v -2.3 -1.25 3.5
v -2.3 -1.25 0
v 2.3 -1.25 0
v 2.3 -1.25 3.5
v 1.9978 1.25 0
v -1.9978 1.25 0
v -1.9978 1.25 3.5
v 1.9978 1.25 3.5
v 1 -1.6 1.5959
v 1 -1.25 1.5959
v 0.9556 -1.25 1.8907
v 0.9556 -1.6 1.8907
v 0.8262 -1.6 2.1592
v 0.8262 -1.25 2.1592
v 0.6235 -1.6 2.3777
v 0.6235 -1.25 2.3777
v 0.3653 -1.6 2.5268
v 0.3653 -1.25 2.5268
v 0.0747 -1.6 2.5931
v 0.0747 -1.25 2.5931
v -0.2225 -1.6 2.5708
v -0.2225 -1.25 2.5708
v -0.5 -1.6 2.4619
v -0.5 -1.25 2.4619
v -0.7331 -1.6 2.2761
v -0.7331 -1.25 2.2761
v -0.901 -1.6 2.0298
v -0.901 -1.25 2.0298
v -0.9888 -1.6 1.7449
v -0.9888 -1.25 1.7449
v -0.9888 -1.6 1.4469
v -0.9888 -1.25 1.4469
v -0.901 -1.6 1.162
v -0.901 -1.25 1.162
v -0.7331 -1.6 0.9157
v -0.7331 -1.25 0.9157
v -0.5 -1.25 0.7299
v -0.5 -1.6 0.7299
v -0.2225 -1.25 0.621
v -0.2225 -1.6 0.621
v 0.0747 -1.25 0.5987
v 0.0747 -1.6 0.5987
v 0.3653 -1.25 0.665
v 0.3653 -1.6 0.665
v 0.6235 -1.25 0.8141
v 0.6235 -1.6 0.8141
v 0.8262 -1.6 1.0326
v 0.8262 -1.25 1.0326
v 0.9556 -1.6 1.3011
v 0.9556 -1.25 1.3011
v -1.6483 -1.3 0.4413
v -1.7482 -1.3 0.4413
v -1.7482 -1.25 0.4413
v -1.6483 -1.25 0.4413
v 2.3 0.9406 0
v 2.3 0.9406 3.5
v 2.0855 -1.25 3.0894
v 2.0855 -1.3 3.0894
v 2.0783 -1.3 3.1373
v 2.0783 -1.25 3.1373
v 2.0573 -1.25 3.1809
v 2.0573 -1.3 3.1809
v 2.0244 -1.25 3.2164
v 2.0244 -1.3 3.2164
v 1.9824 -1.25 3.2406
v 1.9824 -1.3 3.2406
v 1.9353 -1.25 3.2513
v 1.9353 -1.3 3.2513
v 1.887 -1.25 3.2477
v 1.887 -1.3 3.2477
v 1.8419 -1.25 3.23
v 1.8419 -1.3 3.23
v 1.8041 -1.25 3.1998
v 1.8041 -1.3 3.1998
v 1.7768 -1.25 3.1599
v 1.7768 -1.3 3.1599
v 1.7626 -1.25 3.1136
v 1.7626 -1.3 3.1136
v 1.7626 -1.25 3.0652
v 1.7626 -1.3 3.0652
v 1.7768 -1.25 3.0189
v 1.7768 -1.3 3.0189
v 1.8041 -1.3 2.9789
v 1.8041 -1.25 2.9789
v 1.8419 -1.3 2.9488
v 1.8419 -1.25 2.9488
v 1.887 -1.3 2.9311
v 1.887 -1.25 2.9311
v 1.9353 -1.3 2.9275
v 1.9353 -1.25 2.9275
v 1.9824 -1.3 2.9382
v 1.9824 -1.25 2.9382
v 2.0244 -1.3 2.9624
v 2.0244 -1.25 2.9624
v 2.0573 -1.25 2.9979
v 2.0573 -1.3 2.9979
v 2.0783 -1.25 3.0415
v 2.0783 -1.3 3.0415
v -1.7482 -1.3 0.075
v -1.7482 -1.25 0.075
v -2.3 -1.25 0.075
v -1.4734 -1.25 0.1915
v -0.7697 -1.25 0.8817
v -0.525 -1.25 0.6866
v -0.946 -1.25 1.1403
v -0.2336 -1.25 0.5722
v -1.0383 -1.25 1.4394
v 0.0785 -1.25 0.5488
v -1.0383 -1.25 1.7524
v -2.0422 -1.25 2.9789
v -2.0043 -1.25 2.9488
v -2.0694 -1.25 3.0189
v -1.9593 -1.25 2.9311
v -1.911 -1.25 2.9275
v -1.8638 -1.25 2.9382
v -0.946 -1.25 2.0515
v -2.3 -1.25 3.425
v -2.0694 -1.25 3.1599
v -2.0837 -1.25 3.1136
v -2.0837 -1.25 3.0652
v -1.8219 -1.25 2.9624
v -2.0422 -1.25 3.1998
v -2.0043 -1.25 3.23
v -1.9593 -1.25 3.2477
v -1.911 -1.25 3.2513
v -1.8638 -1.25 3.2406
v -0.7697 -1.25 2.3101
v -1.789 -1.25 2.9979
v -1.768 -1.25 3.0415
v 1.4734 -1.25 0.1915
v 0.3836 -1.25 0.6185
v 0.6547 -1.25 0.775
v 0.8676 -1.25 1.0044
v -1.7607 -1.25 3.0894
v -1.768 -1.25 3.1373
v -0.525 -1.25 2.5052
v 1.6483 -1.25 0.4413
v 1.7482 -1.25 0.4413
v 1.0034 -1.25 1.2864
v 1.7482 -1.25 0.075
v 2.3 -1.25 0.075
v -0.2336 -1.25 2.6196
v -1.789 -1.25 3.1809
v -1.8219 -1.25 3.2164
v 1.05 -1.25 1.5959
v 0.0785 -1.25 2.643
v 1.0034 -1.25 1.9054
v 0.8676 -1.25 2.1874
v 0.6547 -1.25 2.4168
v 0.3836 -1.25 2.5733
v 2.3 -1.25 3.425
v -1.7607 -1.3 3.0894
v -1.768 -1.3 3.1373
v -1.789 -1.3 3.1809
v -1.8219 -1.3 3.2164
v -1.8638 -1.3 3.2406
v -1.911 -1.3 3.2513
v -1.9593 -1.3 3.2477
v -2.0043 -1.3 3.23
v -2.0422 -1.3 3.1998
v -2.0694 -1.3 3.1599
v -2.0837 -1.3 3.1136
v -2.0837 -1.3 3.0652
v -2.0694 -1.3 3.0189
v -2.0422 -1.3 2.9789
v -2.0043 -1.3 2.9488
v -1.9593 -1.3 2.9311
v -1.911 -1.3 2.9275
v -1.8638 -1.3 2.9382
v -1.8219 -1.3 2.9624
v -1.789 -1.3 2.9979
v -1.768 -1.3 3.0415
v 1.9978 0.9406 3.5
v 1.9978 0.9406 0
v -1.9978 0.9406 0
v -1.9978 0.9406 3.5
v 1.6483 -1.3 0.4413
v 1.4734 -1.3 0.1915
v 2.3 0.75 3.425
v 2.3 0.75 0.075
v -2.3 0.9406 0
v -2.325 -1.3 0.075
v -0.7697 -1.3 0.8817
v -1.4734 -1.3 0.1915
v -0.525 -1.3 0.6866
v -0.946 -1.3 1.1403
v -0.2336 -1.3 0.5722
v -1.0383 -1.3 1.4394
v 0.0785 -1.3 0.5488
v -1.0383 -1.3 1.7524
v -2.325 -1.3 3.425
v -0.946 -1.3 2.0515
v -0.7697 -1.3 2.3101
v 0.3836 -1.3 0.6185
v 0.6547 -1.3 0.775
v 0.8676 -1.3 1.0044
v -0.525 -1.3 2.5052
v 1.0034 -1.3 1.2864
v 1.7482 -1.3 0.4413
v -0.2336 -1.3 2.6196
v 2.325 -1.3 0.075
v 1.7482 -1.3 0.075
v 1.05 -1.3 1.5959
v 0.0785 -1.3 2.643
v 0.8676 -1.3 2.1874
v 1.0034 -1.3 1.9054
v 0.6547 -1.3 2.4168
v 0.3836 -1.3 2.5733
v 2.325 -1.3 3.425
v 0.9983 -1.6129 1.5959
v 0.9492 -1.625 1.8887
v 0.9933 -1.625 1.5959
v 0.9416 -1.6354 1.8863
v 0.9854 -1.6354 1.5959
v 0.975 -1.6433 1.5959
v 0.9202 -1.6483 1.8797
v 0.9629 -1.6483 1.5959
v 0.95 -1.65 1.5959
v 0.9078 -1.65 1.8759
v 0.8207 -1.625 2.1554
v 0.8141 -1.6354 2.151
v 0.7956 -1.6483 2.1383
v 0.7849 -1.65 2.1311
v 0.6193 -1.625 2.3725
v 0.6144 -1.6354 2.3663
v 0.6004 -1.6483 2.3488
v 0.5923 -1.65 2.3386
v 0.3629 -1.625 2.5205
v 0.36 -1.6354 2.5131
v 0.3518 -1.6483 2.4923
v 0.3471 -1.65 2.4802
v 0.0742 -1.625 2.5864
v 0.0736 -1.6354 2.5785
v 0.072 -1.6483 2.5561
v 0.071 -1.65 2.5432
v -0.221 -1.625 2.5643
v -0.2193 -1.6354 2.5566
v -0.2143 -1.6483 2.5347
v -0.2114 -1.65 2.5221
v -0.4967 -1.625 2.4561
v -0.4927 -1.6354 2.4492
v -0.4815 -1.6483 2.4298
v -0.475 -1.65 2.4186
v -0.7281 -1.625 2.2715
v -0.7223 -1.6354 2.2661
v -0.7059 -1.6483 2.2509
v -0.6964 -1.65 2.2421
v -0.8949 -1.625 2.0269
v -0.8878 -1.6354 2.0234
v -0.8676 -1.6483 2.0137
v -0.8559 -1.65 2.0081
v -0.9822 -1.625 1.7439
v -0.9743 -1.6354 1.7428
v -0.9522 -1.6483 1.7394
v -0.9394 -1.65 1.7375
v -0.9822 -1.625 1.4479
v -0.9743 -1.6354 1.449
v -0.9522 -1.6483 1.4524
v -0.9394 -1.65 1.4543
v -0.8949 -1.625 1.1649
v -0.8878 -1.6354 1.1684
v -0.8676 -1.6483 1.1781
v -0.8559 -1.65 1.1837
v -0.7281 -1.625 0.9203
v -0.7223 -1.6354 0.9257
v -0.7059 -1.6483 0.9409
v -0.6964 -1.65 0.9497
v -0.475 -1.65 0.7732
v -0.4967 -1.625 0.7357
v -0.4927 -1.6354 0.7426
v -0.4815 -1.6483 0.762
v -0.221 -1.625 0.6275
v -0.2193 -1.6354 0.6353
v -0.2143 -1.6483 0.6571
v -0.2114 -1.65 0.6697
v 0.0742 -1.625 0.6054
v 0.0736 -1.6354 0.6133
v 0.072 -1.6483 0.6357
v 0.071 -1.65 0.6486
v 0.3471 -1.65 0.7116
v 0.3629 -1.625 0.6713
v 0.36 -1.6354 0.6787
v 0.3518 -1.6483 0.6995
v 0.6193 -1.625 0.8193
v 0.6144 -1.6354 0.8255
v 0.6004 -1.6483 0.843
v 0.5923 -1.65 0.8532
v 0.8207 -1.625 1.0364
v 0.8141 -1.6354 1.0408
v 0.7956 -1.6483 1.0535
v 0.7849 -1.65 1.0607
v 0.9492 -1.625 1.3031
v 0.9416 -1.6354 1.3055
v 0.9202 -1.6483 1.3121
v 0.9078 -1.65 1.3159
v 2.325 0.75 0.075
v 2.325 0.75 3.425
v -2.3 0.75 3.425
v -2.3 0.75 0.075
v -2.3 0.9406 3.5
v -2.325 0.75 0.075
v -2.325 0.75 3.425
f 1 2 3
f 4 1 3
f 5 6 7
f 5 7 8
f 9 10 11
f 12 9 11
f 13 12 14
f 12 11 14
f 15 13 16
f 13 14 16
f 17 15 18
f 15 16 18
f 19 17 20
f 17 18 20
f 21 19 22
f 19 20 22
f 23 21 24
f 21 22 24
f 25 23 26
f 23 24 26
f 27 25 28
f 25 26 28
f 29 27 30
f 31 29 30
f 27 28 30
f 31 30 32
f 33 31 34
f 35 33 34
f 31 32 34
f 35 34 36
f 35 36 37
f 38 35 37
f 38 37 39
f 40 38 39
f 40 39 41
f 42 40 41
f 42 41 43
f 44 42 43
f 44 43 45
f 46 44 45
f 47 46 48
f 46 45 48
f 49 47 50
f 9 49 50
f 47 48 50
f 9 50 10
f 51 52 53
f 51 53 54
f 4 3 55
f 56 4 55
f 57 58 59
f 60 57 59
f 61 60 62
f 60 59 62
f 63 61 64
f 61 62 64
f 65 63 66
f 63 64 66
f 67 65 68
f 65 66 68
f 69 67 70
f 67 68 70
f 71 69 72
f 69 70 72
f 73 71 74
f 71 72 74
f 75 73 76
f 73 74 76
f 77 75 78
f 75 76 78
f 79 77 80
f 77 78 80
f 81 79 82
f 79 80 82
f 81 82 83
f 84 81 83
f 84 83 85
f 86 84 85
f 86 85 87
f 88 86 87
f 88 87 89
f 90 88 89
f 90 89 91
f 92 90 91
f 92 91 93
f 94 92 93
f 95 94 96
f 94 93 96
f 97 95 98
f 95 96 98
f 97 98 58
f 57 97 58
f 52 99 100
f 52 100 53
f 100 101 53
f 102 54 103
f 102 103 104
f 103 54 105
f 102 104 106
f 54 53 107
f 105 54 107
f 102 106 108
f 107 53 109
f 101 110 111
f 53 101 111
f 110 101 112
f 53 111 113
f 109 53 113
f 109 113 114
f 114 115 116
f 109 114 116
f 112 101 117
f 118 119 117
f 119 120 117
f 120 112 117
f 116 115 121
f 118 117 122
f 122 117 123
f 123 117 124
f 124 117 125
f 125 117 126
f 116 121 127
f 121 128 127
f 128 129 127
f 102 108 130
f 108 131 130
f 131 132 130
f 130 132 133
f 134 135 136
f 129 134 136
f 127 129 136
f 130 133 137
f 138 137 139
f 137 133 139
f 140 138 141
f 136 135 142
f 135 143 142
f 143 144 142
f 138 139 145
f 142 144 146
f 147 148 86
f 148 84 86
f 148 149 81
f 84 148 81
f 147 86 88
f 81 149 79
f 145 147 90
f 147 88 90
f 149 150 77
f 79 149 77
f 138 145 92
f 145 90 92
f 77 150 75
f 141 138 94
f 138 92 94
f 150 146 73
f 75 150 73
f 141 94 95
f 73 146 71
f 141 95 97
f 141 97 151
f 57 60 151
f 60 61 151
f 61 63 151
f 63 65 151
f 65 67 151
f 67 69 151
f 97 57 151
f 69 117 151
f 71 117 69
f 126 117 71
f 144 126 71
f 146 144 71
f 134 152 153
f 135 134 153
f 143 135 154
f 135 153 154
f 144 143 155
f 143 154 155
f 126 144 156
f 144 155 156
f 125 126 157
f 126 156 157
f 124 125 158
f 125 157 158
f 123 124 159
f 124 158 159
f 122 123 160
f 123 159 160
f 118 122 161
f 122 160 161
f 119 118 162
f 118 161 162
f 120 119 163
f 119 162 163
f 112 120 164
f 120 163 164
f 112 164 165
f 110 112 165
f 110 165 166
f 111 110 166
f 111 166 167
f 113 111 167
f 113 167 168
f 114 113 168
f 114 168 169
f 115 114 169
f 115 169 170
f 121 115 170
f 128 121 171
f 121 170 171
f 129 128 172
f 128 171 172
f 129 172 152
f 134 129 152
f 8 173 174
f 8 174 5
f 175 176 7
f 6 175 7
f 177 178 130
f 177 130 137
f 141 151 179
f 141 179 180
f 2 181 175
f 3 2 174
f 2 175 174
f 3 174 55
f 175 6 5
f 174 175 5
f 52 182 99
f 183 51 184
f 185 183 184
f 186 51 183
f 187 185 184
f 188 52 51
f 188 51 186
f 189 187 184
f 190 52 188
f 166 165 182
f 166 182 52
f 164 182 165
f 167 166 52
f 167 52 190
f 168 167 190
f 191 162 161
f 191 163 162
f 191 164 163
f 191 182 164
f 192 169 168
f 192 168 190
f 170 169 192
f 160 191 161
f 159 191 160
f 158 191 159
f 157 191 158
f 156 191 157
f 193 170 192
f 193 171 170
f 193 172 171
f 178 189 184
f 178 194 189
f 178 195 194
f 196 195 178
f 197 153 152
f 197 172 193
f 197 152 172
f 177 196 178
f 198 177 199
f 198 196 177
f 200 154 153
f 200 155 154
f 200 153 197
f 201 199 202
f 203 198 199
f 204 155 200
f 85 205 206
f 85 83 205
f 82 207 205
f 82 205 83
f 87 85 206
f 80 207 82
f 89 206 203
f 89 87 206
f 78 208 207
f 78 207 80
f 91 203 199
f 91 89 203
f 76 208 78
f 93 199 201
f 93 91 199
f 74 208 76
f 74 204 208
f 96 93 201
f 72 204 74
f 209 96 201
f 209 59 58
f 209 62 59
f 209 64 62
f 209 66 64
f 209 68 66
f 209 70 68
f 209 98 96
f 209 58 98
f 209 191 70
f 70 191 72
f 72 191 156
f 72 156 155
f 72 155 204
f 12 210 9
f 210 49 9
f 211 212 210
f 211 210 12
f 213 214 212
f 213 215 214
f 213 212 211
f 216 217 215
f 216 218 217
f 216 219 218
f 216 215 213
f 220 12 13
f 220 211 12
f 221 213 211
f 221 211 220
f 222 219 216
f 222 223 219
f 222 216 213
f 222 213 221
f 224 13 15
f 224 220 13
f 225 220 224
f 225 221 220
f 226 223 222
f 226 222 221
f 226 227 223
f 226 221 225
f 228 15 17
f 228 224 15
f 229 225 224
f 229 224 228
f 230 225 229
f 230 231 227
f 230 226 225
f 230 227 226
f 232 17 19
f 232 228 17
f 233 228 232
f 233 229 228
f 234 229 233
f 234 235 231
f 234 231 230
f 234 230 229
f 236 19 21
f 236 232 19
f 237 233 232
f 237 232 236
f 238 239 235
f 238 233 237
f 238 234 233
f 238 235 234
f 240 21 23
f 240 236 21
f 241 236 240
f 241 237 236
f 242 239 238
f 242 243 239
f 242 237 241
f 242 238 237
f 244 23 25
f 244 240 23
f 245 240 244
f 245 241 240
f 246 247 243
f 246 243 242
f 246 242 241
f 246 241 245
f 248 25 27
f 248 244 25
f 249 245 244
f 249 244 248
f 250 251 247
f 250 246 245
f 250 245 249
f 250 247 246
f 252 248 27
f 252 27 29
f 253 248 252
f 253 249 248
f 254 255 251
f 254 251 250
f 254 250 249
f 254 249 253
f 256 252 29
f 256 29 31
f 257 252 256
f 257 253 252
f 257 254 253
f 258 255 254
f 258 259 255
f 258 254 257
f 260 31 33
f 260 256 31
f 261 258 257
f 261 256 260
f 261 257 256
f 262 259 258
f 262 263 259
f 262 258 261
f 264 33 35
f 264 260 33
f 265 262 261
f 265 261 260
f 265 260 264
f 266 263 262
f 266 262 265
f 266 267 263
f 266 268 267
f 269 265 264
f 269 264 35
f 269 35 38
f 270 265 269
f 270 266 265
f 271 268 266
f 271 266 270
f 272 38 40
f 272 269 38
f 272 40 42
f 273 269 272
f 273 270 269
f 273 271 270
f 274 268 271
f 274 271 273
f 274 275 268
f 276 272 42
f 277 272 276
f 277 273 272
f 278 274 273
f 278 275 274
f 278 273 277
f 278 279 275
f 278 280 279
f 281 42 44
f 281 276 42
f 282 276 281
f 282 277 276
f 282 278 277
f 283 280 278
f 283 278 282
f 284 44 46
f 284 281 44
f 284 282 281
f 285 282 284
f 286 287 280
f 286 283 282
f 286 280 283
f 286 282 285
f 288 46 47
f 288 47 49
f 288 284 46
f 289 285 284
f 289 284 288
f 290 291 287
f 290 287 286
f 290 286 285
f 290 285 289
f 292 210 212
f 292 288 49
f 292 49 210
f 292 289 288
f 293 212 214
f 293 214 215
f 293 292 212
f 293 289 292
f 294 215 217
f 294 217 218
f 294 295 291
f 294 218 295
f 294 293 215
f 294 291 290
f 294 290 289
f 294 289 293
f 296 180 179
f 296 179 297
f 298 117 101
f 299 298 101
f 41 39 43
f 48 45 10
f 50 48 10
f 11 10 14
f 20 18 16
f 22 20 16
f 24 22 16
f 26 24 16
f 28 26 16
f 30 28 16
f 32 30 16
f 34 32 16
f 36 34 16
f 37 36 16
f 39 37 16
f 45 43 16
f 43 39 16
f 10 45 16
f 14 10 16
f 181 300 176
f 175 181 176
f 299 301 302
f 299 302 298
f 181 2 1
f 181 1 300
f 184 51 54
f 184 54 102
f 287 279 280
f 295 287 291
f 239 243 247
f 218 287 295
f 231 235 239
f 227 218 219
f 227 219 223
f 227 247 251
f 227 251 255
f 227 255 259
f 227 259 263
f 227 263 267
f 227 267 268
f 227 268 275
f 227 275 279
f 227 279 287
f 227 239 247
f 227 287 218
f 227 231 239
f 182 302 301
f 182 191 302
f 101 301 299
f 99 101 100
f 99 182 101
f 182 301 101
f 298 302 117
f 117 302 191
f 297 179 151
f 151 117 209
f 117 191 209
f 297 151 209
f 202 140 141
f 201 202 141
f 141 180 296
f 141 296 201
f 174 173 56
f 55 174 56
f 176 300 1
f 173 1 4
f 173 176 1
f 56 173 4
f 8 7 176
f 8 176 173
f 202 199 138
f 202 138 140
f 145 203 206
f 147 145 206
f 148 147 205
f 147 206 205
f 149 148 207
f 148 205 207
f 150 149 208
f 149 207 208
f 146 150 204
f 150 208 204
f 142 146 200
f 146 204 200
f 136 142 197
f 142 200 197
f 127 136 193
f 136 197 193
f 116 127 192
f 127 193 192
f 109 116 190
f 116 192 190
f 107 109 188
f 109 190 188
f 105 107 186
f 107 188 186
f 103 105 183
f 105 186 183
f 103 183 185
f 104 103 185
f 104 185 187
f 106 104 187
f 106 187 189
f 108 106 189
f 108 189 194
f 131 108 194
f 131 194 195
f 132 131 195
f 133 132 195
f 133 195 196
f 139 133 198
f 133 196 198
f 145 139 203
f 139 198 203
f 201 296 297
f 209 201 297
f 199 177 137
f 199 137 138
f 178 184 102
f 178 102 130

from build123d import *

# Parameters (mm, degrees)
SZKIC1_W                    = 4.6
SZKIC1_H                    = 2.5
DODANIE_WYCI_GNI_CIE1_DEPTH = 3.5
SZKIC2_W                    = 0.302200239
SZKIC2_H                    = 0.309416308
WYTNIJ_WYCI_GNI_CIE1_DEPTH  = 4.5
SZKIC3_W                    = 4.65
SZKIC3_H                    = 3.35
DODANIE_WYCI_GNI_CIE2_DEPTH = 0.05
SZKIC4_R                    = 0.162382369
SZKIC4_R_2                  = 1.05
WYTNIJ_WYCI_GNI_CIE2_DEPTH  = 0.05
SZKIC5_R                    = 1
DODANIE_WYCI_GNI_CIE3_DEPTH = 0.4
ZAOKR_GLENIE1_R             = 0.05
SZKIC6_W                    = 0.025
SZKIC6_H                    = 3.35
DODANIE_WYCI_GNI_CIE4_DEPTH = 2


with BuildPart() as part:
    # Szkic1 → Dodanie-wyciągnięcie1 (new body)
    with BuildSketch(Plane.XY):
        Rectangle(SZKIC1_W, SZKIC1_H)
    extrude(amount=DODANIE_WYCI_GNI_CIE1_DEPTH)

    # Szkic2 → Wytnij-wyciągnięcie1 (cut, through all)
    with BuildSketch(Plane.XY.offset(3.5)):
        with Locations((-2.148899881, 1.095291846)):
            Rectangle(SZKIC2_W, SZKIC2_H)
        with Locations((2.148899881, 1.095291846)):
            Rectangle(SZKIC2_W, SZKIC2_H)
    extrude(amount=-WYTNIJ_WYCI_GNI_CIE1_DEPTH, mode=Mode.SUBTRACT)


with BuildPart() as body_2:
    # Szkic3 → Dodanie-wyciągnięcie2 (new body)
    with BuildSketch(Plane.XZ.offset(1.25)):
        with Locations((0, 1.75)):
            Rectangle(SZKIC3_W, SZKIC3_H)
    extrude(amount=DODANIE_WYCI_GNI_CIE2_DEPTH)

    # Szkic4 → Wytnij-wyciągnięcie2 (cut)
    with BuildSketch(Plane.XZ.offset(1.3)):
        with Locations((-1.92312306, 3.089394939)):
            Circle(SZKIC4_R)
        with Locations((1.92312306, 3.089394939)):
            Circle(SZKIC4_R)
        with Locations((0, 1.59590093)):
            Circle(SZKIC4_R_2)
        Polygon((-1.74824974, 0.075), (-1.74824974, 0.441313237), (-1.648322128, 0.441313237), (-1.473448808, 0.191494209), (1.473448808, 0.191494209), (1.648322128, 0.441313237), (1.74824974, 0.441313237), (1.74824974, 0.075), align=None)
    extrude(amount=-WYTNIJ_WYCI_GNI_CIE2_DEPTH, mode=Mode.SUBTRACT)

    # Szkic6 → Dodanie-wyciągnięcie4 (add)
    with BuildSketch(Plane(origin=(0, -1.25, 0), x_dir=(1, 0, 0), z_dir=(0, 1, 0))):
        with Locations((-2.3125, -1.75)):
            Rectangle(SZKIC6_W, SZKIC6_H)
        with Locations((2.3125, -1.75)):
            Rectangle(SZKIC6_W, SZKIC6_H)
    extrude(amount=DODANIE_WYCI_GNI_CIE4_DEPTH)


with BuildPart() as body_3:
    # Szkic5 → Dodanie-wyciągnięcie3 (new body)
    with BuildSketch(Plane.XZ.offset(1.25)):
        with Locations((0, 1.59590093)):
            Circle(SZKIC5_R)
    extrude(amount=DODANIE_WYCI_GNI_CIE3_DEPTH)

    # Zaokrąglenie1
    zaokr_glenie1_edges = [body_3.edges().sort_by_distance(p)[0] for p in [
        (-1, -1.65, 1.59590093),
    ]]
    fillet(zaokr_glenie1_edges, radius=ZAOKR_GLENIE1_R)


solid = Compound([part.part, body_2.part, body_3.part])
